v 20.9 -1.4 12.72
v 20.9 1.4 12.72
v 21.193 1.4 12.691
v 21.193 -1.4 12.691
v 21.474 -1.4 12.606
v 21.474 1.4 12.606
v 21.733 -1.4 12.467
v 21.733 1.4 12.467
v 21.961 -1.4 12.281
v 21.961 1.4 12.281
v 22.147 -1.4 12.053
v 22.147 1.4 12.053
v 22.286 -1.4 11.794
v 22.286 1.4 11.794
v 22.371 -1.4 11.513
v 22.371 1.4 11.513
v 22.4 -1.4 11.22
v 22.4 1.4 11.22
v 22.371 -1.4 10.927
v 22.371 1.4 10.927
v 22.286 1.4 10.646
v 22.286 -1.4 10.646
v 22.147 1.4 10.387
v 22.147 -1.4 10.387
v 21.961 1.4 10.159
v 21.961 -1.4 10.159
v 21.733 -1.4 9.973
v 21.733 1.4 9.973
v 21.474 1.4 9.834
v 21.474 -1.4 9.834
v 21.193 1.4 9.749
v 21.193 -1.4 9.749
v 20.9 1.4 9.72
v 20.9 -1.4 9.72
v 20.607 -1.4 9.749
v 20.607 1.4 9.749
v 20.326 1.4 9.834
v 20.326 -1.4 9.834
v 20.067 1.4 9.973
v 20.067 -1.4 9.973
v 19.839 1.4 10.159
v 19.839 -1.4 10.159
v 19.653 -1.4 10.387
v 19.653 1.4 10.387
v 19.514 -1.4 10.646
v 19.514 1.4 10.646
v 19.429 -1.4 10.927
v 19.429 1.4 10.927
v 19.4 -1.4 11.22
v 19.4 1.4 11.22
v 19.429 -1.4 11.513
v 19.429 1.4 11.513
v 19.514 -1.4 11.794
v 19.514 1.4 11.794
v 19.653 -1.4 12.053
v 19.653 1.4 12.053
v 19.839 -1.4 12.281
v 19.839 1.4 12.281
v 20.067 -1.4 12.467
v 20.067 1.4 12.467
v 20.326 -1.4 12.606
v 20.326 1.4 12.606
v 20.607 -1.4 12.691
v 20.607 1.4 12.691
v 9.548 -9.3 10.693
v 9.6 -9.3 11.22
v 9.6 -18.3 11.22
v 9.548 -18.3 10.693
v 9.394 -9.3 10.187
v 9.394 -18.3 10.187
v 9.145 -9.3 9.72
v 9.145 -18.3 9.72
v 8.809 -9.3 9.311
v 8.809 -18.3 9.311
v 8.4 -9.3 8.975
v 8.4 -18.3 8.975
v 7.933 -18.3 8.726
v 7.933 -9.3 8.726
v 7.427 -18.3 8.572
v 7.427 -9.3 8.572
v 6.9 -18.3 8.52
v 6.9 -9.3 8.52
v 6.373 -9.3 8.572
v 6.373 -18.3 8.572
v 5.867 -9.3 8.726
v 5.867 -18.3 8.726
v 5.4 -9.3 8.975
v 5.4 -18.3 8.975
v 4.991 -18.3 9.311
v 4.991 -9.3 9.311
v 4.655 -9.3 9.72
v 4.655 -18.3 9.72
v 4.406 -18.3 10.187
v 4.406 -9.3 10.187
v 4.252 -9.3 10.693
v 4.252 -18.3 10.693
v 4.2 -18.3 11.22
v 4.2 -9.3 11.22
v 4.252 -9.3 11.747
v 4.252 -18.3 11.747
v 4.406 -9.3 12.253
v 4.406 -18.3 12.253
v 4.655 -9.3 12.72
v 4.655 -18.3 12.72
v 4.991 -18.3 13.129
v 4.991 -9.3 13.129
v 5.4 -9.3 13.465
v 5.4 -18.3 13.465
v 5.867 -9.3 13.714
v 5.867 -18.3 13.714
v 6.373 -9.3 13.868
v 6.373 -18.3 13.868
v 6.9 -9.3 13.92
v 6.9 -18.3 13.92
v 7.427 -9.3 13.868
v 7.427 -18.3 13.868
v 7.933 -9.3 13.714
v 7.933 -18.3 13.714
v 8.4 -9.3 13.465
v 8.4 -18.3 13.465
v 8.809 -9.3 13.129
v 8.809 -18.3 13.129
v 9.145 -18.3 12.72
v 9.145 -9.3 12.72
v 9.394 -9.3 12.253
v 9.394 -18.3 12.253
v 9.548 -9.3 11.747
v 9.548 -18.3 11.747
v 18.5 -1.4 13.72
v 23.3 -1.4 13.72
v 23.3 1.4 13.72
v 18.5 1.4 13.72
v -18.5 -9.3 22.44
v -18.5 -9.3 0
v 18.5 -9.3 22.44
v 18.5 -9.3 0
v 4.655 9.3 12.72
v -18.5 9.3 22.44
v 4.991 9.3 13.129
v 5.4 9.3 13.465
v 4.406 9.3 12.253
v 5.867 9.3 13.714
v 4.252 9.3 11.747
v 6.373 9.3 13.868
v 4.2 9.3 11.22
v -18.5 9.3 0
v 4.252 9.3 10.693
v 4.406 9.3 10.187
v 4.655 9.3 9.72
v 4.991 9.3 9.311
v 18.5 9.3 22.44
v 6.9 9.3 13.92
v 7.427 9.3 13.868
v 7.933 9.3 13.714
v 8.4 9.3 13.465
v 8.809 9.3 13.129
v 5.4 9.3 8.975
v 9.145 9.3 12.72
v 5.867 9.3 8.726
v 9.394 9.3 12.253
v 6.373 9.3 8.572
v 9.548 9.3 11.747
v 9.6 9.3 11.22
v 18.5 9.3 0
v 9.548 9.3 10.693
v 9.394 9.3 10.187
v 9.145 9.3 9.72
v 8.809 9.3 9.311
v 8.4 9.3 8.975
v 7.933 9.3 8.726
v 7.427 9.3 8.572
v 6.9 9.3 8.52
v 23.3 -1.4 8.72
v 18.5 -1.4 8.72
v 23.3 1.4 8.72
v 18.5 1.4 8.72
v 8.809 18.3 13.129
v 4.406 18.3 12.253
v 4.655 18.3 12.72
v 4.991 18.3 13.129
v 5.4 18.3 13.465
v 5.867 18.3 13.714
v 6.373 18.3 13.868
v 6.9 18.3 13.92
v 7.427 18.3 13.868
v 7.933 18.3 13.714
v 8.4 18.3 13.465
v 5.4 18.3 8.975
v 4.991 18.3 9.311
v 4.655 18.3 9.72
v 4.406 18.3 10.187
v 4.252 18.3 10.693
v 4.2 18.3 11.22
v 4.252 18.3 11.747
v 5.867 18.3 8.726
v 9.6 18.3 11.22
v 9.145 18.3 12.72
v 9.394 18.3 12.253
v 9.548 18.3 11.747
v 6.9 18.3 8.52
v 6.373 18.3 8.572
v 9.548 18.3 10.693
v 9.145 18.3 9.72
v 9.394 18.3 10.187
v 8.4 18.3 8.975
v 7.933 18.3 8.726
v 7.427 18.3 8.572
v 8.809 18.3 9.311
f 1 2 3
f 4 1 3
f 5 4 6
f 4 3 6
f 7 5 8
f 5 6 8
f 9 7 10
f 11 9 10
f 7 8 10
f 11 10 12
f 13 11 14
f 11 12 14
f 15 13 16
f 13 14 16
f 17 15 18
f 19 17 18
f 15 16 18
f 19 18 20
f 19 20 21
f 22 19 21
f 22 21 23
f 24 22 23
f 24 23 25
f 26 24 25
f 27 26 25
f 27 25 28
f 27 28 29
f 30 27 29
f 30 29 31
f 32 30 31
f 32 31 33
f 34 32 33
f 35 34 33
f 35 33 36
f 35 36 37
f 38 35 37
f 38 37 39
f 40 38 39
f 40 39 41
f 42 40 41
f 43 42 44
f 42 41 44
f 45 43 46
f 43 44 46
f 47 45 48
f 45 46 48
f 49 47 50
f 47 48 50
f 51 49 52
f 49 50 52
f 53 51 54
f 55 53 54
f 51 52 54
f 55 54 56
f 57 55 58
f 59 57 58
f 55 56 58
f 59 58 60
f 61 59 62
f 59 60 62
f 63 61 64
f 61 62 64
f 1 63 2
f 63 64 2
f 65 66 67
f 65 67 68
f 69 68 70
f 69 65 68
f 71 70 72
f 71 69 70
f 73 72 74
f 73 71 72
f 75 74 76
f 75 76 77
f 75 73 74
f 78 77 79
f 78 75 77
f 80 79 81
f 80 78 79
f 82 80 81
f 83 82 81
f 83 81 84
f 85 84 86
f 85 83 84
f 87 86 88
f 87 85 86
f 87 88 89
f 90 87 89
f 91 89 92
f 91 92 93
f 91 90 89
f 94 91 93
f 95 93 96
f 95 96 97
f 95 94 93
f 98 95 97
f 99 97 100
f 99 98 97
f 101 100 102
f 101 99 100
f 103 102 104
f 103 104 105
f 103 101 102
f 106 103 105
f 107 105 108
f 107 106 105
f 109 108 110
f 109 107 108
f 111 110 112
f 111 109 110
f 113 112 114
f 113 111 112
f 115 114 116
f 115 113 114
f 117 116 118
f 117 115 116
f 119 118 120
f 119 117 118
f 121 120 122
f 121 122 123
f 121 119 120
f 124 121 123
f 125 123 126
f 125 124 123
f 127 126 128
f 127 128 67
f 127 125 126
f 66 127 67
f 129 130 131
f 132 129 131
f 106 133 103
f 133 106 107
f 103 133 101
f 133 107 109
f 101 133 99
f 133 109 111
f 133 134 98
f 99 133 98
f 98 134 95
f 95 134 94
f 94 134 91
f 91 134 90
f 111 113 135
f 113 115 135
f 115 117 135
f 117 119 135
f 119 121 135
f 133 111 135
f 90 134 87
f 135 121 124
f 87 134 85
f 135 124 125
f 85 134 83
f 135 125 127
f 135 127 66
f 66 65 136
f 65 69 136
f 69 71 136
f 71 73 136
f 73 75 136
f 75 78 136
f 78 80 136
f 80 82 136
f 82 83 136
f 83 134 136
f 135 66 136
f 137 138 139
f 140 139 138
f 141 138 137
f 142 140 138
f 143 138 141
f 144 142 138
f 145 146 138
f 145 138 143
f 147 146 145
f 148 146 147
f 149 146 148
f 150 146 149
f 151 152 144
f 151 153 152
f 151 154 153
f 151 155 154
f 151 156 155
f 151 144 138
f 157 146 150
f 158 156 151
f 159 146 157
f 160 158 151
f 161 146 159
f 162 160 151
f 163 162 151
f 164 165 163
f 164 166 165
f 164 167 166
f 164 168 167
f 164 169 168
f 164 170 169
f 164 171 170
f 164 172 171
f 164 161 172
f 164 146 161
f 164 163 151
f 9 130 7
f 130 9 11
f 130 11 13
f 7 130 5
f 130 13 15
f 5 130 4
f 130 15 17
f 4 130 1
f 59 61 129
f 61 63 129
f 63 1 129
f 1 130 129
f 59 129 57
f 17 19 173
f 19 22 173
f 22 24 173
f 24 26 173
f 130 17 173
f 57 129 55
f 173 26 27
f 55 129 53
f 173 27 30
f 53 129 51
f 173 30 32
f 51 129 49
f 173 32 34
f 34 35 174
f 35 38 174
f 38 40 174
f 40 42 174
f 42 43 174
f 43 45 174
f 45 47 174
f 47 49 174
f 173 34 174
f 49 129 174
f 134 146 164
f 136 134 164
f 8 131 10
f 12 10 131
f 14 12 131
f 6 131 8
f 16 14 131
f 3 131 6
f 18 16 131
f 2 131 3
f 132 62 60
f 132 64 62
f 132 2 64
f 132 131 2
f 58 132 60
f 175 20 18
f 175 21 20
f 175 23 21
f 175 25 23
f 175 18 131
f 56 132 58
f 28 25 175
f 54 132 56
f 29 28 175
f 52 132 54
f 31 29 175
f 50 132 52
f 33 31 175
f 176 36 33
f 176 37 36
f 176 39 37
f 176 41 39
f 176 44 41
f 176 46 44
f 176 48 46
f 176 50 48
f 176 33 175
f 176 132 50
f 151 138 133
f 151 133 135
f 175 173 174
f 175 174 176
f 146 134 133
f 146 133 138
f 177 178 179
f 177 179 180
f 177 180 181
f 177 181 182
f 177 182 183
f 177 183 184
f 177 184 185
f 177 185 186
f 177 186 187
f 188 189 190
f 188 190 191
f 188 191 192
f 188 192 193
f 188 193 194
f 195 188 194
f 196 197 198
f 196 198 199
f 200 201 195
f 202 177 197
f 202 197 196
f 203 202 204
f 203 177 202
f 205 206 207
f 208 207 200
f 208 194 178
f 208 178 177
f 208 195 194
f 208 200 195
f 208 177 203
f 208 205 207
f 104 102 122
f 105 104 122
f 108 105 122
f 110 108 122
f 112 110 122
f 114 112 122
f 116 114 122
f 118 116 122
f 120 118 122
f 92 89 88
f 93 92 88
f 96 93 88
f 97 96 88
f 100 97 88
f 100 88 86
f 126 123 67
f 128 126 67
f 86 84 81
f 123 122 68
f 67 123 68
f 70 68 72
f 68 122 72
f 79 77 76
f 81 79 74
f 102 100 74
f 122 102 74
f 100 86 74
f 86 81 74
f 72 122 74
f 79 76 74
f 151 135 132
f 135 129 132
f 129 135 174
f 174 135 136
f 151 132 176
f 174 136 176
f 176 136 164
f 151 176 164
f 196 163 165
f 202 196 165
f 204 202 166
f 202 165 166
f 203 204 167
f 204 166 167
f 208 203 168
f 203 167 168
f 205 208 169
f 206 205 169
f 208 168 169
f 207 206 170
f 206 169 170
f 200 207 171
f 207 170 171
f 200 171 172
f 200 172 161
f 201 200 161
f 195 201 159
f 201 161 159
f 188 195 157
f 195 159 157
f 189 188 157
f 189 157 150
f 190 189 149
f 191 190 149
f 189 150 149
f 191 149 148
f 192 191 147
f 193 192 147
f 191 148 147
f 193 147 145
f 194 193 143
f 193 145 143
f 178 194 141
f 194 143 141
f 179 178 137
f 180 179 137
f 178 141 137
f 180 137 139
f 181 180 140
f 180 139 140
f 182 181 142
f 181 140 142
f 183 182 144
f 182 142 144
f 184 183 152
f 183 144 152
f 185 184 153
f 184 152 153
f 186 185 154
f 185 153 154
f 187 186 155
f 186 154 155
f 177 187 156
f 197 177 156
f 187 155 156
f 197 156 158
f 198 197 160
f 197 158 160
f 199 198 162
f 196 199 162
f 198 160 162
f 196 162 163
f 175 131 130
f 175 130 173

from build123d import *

# Parameters (mm, degrees)
SKETCH1_W           = 37
SKETCH1_H           = 18.6
BOSS_EXTRUDE1_DEPTH = 22.44
SKETCH6_W           = 5
SKETCH6_H           = 2.8
BOSS_EXTRUDE2_DEPTH = 4.8
CUT_EXTRUDE1_REACH  = 36.072
SKETCH7_R           = 1.5
SKETCH8_R           = 2.7
BOSS_EXTRUDE3_DEPTH = 9


with BuildPart() as part:
    # Sketch1 → Boss-Extrude1 (new body)
    with BuildSketch(Plane.XY):
        Rectangle(SKETCH1_W, SKETCH1_H)
    extrude(amount=BOSS_EXTRUDE1_DEPTH)

    # Sketch6 → Boss-Extrude2 (add)
    with BuildSketch(Plane(origin=(18.5, 0, 0), x_dir=(0, 0, -1), z_dir=(1, 0, 0))):
        with Locations((-11.22, 0)):
            Rectangle(SKETCH6_W, SKETCH6_H)
    extrude(amount=BOSS_EXTRUDE2_DEPTH)

    # Sketch7 → Cut-Extrude1 (cut, up to next)
    with BuildSketch(Plane(origin=(0, 1.4, 0), x_dir=(1, 0, 0), z_dir=(0, 1, 0)), mode=Mode.PRIVATE) as cut_extrude1_sk1:
        with Locations(Location((20.9, -11.22, 0), (0, 0, 270))):
            Circle(SKETCH7_R)
    cut_extrude1_tool1 = extrude(cut_extrude1_sk1.sketch, amount=-CUT_EXTRUDE1_REACH, mode=Mode.PRIVATE) & part.part
    add(cut_extrude1_tool1.solids().sort_by_distance((20.9, 1.4, 11.22))[0], mode=Mode.SUBTRACT)

    # Sketch8 → Boss-Extrude3 (add)
    with BuildSketch(Plane(origin=(0, 9.3, 0), x_dir=(1, 0, 0), z_dir=(0, 1, 0))):
        with Locations((6.9, -11.22)):
            Circle(SKETCH8_R)
    boss_extrude3 = extrude(amount=BOSS_EXTRUDE3_DEPTH)

    # Mirror1: Boss-Extrude3 across plane
    add(boss_extrude3.mirror(Plane.ZX))


solid = part.part
